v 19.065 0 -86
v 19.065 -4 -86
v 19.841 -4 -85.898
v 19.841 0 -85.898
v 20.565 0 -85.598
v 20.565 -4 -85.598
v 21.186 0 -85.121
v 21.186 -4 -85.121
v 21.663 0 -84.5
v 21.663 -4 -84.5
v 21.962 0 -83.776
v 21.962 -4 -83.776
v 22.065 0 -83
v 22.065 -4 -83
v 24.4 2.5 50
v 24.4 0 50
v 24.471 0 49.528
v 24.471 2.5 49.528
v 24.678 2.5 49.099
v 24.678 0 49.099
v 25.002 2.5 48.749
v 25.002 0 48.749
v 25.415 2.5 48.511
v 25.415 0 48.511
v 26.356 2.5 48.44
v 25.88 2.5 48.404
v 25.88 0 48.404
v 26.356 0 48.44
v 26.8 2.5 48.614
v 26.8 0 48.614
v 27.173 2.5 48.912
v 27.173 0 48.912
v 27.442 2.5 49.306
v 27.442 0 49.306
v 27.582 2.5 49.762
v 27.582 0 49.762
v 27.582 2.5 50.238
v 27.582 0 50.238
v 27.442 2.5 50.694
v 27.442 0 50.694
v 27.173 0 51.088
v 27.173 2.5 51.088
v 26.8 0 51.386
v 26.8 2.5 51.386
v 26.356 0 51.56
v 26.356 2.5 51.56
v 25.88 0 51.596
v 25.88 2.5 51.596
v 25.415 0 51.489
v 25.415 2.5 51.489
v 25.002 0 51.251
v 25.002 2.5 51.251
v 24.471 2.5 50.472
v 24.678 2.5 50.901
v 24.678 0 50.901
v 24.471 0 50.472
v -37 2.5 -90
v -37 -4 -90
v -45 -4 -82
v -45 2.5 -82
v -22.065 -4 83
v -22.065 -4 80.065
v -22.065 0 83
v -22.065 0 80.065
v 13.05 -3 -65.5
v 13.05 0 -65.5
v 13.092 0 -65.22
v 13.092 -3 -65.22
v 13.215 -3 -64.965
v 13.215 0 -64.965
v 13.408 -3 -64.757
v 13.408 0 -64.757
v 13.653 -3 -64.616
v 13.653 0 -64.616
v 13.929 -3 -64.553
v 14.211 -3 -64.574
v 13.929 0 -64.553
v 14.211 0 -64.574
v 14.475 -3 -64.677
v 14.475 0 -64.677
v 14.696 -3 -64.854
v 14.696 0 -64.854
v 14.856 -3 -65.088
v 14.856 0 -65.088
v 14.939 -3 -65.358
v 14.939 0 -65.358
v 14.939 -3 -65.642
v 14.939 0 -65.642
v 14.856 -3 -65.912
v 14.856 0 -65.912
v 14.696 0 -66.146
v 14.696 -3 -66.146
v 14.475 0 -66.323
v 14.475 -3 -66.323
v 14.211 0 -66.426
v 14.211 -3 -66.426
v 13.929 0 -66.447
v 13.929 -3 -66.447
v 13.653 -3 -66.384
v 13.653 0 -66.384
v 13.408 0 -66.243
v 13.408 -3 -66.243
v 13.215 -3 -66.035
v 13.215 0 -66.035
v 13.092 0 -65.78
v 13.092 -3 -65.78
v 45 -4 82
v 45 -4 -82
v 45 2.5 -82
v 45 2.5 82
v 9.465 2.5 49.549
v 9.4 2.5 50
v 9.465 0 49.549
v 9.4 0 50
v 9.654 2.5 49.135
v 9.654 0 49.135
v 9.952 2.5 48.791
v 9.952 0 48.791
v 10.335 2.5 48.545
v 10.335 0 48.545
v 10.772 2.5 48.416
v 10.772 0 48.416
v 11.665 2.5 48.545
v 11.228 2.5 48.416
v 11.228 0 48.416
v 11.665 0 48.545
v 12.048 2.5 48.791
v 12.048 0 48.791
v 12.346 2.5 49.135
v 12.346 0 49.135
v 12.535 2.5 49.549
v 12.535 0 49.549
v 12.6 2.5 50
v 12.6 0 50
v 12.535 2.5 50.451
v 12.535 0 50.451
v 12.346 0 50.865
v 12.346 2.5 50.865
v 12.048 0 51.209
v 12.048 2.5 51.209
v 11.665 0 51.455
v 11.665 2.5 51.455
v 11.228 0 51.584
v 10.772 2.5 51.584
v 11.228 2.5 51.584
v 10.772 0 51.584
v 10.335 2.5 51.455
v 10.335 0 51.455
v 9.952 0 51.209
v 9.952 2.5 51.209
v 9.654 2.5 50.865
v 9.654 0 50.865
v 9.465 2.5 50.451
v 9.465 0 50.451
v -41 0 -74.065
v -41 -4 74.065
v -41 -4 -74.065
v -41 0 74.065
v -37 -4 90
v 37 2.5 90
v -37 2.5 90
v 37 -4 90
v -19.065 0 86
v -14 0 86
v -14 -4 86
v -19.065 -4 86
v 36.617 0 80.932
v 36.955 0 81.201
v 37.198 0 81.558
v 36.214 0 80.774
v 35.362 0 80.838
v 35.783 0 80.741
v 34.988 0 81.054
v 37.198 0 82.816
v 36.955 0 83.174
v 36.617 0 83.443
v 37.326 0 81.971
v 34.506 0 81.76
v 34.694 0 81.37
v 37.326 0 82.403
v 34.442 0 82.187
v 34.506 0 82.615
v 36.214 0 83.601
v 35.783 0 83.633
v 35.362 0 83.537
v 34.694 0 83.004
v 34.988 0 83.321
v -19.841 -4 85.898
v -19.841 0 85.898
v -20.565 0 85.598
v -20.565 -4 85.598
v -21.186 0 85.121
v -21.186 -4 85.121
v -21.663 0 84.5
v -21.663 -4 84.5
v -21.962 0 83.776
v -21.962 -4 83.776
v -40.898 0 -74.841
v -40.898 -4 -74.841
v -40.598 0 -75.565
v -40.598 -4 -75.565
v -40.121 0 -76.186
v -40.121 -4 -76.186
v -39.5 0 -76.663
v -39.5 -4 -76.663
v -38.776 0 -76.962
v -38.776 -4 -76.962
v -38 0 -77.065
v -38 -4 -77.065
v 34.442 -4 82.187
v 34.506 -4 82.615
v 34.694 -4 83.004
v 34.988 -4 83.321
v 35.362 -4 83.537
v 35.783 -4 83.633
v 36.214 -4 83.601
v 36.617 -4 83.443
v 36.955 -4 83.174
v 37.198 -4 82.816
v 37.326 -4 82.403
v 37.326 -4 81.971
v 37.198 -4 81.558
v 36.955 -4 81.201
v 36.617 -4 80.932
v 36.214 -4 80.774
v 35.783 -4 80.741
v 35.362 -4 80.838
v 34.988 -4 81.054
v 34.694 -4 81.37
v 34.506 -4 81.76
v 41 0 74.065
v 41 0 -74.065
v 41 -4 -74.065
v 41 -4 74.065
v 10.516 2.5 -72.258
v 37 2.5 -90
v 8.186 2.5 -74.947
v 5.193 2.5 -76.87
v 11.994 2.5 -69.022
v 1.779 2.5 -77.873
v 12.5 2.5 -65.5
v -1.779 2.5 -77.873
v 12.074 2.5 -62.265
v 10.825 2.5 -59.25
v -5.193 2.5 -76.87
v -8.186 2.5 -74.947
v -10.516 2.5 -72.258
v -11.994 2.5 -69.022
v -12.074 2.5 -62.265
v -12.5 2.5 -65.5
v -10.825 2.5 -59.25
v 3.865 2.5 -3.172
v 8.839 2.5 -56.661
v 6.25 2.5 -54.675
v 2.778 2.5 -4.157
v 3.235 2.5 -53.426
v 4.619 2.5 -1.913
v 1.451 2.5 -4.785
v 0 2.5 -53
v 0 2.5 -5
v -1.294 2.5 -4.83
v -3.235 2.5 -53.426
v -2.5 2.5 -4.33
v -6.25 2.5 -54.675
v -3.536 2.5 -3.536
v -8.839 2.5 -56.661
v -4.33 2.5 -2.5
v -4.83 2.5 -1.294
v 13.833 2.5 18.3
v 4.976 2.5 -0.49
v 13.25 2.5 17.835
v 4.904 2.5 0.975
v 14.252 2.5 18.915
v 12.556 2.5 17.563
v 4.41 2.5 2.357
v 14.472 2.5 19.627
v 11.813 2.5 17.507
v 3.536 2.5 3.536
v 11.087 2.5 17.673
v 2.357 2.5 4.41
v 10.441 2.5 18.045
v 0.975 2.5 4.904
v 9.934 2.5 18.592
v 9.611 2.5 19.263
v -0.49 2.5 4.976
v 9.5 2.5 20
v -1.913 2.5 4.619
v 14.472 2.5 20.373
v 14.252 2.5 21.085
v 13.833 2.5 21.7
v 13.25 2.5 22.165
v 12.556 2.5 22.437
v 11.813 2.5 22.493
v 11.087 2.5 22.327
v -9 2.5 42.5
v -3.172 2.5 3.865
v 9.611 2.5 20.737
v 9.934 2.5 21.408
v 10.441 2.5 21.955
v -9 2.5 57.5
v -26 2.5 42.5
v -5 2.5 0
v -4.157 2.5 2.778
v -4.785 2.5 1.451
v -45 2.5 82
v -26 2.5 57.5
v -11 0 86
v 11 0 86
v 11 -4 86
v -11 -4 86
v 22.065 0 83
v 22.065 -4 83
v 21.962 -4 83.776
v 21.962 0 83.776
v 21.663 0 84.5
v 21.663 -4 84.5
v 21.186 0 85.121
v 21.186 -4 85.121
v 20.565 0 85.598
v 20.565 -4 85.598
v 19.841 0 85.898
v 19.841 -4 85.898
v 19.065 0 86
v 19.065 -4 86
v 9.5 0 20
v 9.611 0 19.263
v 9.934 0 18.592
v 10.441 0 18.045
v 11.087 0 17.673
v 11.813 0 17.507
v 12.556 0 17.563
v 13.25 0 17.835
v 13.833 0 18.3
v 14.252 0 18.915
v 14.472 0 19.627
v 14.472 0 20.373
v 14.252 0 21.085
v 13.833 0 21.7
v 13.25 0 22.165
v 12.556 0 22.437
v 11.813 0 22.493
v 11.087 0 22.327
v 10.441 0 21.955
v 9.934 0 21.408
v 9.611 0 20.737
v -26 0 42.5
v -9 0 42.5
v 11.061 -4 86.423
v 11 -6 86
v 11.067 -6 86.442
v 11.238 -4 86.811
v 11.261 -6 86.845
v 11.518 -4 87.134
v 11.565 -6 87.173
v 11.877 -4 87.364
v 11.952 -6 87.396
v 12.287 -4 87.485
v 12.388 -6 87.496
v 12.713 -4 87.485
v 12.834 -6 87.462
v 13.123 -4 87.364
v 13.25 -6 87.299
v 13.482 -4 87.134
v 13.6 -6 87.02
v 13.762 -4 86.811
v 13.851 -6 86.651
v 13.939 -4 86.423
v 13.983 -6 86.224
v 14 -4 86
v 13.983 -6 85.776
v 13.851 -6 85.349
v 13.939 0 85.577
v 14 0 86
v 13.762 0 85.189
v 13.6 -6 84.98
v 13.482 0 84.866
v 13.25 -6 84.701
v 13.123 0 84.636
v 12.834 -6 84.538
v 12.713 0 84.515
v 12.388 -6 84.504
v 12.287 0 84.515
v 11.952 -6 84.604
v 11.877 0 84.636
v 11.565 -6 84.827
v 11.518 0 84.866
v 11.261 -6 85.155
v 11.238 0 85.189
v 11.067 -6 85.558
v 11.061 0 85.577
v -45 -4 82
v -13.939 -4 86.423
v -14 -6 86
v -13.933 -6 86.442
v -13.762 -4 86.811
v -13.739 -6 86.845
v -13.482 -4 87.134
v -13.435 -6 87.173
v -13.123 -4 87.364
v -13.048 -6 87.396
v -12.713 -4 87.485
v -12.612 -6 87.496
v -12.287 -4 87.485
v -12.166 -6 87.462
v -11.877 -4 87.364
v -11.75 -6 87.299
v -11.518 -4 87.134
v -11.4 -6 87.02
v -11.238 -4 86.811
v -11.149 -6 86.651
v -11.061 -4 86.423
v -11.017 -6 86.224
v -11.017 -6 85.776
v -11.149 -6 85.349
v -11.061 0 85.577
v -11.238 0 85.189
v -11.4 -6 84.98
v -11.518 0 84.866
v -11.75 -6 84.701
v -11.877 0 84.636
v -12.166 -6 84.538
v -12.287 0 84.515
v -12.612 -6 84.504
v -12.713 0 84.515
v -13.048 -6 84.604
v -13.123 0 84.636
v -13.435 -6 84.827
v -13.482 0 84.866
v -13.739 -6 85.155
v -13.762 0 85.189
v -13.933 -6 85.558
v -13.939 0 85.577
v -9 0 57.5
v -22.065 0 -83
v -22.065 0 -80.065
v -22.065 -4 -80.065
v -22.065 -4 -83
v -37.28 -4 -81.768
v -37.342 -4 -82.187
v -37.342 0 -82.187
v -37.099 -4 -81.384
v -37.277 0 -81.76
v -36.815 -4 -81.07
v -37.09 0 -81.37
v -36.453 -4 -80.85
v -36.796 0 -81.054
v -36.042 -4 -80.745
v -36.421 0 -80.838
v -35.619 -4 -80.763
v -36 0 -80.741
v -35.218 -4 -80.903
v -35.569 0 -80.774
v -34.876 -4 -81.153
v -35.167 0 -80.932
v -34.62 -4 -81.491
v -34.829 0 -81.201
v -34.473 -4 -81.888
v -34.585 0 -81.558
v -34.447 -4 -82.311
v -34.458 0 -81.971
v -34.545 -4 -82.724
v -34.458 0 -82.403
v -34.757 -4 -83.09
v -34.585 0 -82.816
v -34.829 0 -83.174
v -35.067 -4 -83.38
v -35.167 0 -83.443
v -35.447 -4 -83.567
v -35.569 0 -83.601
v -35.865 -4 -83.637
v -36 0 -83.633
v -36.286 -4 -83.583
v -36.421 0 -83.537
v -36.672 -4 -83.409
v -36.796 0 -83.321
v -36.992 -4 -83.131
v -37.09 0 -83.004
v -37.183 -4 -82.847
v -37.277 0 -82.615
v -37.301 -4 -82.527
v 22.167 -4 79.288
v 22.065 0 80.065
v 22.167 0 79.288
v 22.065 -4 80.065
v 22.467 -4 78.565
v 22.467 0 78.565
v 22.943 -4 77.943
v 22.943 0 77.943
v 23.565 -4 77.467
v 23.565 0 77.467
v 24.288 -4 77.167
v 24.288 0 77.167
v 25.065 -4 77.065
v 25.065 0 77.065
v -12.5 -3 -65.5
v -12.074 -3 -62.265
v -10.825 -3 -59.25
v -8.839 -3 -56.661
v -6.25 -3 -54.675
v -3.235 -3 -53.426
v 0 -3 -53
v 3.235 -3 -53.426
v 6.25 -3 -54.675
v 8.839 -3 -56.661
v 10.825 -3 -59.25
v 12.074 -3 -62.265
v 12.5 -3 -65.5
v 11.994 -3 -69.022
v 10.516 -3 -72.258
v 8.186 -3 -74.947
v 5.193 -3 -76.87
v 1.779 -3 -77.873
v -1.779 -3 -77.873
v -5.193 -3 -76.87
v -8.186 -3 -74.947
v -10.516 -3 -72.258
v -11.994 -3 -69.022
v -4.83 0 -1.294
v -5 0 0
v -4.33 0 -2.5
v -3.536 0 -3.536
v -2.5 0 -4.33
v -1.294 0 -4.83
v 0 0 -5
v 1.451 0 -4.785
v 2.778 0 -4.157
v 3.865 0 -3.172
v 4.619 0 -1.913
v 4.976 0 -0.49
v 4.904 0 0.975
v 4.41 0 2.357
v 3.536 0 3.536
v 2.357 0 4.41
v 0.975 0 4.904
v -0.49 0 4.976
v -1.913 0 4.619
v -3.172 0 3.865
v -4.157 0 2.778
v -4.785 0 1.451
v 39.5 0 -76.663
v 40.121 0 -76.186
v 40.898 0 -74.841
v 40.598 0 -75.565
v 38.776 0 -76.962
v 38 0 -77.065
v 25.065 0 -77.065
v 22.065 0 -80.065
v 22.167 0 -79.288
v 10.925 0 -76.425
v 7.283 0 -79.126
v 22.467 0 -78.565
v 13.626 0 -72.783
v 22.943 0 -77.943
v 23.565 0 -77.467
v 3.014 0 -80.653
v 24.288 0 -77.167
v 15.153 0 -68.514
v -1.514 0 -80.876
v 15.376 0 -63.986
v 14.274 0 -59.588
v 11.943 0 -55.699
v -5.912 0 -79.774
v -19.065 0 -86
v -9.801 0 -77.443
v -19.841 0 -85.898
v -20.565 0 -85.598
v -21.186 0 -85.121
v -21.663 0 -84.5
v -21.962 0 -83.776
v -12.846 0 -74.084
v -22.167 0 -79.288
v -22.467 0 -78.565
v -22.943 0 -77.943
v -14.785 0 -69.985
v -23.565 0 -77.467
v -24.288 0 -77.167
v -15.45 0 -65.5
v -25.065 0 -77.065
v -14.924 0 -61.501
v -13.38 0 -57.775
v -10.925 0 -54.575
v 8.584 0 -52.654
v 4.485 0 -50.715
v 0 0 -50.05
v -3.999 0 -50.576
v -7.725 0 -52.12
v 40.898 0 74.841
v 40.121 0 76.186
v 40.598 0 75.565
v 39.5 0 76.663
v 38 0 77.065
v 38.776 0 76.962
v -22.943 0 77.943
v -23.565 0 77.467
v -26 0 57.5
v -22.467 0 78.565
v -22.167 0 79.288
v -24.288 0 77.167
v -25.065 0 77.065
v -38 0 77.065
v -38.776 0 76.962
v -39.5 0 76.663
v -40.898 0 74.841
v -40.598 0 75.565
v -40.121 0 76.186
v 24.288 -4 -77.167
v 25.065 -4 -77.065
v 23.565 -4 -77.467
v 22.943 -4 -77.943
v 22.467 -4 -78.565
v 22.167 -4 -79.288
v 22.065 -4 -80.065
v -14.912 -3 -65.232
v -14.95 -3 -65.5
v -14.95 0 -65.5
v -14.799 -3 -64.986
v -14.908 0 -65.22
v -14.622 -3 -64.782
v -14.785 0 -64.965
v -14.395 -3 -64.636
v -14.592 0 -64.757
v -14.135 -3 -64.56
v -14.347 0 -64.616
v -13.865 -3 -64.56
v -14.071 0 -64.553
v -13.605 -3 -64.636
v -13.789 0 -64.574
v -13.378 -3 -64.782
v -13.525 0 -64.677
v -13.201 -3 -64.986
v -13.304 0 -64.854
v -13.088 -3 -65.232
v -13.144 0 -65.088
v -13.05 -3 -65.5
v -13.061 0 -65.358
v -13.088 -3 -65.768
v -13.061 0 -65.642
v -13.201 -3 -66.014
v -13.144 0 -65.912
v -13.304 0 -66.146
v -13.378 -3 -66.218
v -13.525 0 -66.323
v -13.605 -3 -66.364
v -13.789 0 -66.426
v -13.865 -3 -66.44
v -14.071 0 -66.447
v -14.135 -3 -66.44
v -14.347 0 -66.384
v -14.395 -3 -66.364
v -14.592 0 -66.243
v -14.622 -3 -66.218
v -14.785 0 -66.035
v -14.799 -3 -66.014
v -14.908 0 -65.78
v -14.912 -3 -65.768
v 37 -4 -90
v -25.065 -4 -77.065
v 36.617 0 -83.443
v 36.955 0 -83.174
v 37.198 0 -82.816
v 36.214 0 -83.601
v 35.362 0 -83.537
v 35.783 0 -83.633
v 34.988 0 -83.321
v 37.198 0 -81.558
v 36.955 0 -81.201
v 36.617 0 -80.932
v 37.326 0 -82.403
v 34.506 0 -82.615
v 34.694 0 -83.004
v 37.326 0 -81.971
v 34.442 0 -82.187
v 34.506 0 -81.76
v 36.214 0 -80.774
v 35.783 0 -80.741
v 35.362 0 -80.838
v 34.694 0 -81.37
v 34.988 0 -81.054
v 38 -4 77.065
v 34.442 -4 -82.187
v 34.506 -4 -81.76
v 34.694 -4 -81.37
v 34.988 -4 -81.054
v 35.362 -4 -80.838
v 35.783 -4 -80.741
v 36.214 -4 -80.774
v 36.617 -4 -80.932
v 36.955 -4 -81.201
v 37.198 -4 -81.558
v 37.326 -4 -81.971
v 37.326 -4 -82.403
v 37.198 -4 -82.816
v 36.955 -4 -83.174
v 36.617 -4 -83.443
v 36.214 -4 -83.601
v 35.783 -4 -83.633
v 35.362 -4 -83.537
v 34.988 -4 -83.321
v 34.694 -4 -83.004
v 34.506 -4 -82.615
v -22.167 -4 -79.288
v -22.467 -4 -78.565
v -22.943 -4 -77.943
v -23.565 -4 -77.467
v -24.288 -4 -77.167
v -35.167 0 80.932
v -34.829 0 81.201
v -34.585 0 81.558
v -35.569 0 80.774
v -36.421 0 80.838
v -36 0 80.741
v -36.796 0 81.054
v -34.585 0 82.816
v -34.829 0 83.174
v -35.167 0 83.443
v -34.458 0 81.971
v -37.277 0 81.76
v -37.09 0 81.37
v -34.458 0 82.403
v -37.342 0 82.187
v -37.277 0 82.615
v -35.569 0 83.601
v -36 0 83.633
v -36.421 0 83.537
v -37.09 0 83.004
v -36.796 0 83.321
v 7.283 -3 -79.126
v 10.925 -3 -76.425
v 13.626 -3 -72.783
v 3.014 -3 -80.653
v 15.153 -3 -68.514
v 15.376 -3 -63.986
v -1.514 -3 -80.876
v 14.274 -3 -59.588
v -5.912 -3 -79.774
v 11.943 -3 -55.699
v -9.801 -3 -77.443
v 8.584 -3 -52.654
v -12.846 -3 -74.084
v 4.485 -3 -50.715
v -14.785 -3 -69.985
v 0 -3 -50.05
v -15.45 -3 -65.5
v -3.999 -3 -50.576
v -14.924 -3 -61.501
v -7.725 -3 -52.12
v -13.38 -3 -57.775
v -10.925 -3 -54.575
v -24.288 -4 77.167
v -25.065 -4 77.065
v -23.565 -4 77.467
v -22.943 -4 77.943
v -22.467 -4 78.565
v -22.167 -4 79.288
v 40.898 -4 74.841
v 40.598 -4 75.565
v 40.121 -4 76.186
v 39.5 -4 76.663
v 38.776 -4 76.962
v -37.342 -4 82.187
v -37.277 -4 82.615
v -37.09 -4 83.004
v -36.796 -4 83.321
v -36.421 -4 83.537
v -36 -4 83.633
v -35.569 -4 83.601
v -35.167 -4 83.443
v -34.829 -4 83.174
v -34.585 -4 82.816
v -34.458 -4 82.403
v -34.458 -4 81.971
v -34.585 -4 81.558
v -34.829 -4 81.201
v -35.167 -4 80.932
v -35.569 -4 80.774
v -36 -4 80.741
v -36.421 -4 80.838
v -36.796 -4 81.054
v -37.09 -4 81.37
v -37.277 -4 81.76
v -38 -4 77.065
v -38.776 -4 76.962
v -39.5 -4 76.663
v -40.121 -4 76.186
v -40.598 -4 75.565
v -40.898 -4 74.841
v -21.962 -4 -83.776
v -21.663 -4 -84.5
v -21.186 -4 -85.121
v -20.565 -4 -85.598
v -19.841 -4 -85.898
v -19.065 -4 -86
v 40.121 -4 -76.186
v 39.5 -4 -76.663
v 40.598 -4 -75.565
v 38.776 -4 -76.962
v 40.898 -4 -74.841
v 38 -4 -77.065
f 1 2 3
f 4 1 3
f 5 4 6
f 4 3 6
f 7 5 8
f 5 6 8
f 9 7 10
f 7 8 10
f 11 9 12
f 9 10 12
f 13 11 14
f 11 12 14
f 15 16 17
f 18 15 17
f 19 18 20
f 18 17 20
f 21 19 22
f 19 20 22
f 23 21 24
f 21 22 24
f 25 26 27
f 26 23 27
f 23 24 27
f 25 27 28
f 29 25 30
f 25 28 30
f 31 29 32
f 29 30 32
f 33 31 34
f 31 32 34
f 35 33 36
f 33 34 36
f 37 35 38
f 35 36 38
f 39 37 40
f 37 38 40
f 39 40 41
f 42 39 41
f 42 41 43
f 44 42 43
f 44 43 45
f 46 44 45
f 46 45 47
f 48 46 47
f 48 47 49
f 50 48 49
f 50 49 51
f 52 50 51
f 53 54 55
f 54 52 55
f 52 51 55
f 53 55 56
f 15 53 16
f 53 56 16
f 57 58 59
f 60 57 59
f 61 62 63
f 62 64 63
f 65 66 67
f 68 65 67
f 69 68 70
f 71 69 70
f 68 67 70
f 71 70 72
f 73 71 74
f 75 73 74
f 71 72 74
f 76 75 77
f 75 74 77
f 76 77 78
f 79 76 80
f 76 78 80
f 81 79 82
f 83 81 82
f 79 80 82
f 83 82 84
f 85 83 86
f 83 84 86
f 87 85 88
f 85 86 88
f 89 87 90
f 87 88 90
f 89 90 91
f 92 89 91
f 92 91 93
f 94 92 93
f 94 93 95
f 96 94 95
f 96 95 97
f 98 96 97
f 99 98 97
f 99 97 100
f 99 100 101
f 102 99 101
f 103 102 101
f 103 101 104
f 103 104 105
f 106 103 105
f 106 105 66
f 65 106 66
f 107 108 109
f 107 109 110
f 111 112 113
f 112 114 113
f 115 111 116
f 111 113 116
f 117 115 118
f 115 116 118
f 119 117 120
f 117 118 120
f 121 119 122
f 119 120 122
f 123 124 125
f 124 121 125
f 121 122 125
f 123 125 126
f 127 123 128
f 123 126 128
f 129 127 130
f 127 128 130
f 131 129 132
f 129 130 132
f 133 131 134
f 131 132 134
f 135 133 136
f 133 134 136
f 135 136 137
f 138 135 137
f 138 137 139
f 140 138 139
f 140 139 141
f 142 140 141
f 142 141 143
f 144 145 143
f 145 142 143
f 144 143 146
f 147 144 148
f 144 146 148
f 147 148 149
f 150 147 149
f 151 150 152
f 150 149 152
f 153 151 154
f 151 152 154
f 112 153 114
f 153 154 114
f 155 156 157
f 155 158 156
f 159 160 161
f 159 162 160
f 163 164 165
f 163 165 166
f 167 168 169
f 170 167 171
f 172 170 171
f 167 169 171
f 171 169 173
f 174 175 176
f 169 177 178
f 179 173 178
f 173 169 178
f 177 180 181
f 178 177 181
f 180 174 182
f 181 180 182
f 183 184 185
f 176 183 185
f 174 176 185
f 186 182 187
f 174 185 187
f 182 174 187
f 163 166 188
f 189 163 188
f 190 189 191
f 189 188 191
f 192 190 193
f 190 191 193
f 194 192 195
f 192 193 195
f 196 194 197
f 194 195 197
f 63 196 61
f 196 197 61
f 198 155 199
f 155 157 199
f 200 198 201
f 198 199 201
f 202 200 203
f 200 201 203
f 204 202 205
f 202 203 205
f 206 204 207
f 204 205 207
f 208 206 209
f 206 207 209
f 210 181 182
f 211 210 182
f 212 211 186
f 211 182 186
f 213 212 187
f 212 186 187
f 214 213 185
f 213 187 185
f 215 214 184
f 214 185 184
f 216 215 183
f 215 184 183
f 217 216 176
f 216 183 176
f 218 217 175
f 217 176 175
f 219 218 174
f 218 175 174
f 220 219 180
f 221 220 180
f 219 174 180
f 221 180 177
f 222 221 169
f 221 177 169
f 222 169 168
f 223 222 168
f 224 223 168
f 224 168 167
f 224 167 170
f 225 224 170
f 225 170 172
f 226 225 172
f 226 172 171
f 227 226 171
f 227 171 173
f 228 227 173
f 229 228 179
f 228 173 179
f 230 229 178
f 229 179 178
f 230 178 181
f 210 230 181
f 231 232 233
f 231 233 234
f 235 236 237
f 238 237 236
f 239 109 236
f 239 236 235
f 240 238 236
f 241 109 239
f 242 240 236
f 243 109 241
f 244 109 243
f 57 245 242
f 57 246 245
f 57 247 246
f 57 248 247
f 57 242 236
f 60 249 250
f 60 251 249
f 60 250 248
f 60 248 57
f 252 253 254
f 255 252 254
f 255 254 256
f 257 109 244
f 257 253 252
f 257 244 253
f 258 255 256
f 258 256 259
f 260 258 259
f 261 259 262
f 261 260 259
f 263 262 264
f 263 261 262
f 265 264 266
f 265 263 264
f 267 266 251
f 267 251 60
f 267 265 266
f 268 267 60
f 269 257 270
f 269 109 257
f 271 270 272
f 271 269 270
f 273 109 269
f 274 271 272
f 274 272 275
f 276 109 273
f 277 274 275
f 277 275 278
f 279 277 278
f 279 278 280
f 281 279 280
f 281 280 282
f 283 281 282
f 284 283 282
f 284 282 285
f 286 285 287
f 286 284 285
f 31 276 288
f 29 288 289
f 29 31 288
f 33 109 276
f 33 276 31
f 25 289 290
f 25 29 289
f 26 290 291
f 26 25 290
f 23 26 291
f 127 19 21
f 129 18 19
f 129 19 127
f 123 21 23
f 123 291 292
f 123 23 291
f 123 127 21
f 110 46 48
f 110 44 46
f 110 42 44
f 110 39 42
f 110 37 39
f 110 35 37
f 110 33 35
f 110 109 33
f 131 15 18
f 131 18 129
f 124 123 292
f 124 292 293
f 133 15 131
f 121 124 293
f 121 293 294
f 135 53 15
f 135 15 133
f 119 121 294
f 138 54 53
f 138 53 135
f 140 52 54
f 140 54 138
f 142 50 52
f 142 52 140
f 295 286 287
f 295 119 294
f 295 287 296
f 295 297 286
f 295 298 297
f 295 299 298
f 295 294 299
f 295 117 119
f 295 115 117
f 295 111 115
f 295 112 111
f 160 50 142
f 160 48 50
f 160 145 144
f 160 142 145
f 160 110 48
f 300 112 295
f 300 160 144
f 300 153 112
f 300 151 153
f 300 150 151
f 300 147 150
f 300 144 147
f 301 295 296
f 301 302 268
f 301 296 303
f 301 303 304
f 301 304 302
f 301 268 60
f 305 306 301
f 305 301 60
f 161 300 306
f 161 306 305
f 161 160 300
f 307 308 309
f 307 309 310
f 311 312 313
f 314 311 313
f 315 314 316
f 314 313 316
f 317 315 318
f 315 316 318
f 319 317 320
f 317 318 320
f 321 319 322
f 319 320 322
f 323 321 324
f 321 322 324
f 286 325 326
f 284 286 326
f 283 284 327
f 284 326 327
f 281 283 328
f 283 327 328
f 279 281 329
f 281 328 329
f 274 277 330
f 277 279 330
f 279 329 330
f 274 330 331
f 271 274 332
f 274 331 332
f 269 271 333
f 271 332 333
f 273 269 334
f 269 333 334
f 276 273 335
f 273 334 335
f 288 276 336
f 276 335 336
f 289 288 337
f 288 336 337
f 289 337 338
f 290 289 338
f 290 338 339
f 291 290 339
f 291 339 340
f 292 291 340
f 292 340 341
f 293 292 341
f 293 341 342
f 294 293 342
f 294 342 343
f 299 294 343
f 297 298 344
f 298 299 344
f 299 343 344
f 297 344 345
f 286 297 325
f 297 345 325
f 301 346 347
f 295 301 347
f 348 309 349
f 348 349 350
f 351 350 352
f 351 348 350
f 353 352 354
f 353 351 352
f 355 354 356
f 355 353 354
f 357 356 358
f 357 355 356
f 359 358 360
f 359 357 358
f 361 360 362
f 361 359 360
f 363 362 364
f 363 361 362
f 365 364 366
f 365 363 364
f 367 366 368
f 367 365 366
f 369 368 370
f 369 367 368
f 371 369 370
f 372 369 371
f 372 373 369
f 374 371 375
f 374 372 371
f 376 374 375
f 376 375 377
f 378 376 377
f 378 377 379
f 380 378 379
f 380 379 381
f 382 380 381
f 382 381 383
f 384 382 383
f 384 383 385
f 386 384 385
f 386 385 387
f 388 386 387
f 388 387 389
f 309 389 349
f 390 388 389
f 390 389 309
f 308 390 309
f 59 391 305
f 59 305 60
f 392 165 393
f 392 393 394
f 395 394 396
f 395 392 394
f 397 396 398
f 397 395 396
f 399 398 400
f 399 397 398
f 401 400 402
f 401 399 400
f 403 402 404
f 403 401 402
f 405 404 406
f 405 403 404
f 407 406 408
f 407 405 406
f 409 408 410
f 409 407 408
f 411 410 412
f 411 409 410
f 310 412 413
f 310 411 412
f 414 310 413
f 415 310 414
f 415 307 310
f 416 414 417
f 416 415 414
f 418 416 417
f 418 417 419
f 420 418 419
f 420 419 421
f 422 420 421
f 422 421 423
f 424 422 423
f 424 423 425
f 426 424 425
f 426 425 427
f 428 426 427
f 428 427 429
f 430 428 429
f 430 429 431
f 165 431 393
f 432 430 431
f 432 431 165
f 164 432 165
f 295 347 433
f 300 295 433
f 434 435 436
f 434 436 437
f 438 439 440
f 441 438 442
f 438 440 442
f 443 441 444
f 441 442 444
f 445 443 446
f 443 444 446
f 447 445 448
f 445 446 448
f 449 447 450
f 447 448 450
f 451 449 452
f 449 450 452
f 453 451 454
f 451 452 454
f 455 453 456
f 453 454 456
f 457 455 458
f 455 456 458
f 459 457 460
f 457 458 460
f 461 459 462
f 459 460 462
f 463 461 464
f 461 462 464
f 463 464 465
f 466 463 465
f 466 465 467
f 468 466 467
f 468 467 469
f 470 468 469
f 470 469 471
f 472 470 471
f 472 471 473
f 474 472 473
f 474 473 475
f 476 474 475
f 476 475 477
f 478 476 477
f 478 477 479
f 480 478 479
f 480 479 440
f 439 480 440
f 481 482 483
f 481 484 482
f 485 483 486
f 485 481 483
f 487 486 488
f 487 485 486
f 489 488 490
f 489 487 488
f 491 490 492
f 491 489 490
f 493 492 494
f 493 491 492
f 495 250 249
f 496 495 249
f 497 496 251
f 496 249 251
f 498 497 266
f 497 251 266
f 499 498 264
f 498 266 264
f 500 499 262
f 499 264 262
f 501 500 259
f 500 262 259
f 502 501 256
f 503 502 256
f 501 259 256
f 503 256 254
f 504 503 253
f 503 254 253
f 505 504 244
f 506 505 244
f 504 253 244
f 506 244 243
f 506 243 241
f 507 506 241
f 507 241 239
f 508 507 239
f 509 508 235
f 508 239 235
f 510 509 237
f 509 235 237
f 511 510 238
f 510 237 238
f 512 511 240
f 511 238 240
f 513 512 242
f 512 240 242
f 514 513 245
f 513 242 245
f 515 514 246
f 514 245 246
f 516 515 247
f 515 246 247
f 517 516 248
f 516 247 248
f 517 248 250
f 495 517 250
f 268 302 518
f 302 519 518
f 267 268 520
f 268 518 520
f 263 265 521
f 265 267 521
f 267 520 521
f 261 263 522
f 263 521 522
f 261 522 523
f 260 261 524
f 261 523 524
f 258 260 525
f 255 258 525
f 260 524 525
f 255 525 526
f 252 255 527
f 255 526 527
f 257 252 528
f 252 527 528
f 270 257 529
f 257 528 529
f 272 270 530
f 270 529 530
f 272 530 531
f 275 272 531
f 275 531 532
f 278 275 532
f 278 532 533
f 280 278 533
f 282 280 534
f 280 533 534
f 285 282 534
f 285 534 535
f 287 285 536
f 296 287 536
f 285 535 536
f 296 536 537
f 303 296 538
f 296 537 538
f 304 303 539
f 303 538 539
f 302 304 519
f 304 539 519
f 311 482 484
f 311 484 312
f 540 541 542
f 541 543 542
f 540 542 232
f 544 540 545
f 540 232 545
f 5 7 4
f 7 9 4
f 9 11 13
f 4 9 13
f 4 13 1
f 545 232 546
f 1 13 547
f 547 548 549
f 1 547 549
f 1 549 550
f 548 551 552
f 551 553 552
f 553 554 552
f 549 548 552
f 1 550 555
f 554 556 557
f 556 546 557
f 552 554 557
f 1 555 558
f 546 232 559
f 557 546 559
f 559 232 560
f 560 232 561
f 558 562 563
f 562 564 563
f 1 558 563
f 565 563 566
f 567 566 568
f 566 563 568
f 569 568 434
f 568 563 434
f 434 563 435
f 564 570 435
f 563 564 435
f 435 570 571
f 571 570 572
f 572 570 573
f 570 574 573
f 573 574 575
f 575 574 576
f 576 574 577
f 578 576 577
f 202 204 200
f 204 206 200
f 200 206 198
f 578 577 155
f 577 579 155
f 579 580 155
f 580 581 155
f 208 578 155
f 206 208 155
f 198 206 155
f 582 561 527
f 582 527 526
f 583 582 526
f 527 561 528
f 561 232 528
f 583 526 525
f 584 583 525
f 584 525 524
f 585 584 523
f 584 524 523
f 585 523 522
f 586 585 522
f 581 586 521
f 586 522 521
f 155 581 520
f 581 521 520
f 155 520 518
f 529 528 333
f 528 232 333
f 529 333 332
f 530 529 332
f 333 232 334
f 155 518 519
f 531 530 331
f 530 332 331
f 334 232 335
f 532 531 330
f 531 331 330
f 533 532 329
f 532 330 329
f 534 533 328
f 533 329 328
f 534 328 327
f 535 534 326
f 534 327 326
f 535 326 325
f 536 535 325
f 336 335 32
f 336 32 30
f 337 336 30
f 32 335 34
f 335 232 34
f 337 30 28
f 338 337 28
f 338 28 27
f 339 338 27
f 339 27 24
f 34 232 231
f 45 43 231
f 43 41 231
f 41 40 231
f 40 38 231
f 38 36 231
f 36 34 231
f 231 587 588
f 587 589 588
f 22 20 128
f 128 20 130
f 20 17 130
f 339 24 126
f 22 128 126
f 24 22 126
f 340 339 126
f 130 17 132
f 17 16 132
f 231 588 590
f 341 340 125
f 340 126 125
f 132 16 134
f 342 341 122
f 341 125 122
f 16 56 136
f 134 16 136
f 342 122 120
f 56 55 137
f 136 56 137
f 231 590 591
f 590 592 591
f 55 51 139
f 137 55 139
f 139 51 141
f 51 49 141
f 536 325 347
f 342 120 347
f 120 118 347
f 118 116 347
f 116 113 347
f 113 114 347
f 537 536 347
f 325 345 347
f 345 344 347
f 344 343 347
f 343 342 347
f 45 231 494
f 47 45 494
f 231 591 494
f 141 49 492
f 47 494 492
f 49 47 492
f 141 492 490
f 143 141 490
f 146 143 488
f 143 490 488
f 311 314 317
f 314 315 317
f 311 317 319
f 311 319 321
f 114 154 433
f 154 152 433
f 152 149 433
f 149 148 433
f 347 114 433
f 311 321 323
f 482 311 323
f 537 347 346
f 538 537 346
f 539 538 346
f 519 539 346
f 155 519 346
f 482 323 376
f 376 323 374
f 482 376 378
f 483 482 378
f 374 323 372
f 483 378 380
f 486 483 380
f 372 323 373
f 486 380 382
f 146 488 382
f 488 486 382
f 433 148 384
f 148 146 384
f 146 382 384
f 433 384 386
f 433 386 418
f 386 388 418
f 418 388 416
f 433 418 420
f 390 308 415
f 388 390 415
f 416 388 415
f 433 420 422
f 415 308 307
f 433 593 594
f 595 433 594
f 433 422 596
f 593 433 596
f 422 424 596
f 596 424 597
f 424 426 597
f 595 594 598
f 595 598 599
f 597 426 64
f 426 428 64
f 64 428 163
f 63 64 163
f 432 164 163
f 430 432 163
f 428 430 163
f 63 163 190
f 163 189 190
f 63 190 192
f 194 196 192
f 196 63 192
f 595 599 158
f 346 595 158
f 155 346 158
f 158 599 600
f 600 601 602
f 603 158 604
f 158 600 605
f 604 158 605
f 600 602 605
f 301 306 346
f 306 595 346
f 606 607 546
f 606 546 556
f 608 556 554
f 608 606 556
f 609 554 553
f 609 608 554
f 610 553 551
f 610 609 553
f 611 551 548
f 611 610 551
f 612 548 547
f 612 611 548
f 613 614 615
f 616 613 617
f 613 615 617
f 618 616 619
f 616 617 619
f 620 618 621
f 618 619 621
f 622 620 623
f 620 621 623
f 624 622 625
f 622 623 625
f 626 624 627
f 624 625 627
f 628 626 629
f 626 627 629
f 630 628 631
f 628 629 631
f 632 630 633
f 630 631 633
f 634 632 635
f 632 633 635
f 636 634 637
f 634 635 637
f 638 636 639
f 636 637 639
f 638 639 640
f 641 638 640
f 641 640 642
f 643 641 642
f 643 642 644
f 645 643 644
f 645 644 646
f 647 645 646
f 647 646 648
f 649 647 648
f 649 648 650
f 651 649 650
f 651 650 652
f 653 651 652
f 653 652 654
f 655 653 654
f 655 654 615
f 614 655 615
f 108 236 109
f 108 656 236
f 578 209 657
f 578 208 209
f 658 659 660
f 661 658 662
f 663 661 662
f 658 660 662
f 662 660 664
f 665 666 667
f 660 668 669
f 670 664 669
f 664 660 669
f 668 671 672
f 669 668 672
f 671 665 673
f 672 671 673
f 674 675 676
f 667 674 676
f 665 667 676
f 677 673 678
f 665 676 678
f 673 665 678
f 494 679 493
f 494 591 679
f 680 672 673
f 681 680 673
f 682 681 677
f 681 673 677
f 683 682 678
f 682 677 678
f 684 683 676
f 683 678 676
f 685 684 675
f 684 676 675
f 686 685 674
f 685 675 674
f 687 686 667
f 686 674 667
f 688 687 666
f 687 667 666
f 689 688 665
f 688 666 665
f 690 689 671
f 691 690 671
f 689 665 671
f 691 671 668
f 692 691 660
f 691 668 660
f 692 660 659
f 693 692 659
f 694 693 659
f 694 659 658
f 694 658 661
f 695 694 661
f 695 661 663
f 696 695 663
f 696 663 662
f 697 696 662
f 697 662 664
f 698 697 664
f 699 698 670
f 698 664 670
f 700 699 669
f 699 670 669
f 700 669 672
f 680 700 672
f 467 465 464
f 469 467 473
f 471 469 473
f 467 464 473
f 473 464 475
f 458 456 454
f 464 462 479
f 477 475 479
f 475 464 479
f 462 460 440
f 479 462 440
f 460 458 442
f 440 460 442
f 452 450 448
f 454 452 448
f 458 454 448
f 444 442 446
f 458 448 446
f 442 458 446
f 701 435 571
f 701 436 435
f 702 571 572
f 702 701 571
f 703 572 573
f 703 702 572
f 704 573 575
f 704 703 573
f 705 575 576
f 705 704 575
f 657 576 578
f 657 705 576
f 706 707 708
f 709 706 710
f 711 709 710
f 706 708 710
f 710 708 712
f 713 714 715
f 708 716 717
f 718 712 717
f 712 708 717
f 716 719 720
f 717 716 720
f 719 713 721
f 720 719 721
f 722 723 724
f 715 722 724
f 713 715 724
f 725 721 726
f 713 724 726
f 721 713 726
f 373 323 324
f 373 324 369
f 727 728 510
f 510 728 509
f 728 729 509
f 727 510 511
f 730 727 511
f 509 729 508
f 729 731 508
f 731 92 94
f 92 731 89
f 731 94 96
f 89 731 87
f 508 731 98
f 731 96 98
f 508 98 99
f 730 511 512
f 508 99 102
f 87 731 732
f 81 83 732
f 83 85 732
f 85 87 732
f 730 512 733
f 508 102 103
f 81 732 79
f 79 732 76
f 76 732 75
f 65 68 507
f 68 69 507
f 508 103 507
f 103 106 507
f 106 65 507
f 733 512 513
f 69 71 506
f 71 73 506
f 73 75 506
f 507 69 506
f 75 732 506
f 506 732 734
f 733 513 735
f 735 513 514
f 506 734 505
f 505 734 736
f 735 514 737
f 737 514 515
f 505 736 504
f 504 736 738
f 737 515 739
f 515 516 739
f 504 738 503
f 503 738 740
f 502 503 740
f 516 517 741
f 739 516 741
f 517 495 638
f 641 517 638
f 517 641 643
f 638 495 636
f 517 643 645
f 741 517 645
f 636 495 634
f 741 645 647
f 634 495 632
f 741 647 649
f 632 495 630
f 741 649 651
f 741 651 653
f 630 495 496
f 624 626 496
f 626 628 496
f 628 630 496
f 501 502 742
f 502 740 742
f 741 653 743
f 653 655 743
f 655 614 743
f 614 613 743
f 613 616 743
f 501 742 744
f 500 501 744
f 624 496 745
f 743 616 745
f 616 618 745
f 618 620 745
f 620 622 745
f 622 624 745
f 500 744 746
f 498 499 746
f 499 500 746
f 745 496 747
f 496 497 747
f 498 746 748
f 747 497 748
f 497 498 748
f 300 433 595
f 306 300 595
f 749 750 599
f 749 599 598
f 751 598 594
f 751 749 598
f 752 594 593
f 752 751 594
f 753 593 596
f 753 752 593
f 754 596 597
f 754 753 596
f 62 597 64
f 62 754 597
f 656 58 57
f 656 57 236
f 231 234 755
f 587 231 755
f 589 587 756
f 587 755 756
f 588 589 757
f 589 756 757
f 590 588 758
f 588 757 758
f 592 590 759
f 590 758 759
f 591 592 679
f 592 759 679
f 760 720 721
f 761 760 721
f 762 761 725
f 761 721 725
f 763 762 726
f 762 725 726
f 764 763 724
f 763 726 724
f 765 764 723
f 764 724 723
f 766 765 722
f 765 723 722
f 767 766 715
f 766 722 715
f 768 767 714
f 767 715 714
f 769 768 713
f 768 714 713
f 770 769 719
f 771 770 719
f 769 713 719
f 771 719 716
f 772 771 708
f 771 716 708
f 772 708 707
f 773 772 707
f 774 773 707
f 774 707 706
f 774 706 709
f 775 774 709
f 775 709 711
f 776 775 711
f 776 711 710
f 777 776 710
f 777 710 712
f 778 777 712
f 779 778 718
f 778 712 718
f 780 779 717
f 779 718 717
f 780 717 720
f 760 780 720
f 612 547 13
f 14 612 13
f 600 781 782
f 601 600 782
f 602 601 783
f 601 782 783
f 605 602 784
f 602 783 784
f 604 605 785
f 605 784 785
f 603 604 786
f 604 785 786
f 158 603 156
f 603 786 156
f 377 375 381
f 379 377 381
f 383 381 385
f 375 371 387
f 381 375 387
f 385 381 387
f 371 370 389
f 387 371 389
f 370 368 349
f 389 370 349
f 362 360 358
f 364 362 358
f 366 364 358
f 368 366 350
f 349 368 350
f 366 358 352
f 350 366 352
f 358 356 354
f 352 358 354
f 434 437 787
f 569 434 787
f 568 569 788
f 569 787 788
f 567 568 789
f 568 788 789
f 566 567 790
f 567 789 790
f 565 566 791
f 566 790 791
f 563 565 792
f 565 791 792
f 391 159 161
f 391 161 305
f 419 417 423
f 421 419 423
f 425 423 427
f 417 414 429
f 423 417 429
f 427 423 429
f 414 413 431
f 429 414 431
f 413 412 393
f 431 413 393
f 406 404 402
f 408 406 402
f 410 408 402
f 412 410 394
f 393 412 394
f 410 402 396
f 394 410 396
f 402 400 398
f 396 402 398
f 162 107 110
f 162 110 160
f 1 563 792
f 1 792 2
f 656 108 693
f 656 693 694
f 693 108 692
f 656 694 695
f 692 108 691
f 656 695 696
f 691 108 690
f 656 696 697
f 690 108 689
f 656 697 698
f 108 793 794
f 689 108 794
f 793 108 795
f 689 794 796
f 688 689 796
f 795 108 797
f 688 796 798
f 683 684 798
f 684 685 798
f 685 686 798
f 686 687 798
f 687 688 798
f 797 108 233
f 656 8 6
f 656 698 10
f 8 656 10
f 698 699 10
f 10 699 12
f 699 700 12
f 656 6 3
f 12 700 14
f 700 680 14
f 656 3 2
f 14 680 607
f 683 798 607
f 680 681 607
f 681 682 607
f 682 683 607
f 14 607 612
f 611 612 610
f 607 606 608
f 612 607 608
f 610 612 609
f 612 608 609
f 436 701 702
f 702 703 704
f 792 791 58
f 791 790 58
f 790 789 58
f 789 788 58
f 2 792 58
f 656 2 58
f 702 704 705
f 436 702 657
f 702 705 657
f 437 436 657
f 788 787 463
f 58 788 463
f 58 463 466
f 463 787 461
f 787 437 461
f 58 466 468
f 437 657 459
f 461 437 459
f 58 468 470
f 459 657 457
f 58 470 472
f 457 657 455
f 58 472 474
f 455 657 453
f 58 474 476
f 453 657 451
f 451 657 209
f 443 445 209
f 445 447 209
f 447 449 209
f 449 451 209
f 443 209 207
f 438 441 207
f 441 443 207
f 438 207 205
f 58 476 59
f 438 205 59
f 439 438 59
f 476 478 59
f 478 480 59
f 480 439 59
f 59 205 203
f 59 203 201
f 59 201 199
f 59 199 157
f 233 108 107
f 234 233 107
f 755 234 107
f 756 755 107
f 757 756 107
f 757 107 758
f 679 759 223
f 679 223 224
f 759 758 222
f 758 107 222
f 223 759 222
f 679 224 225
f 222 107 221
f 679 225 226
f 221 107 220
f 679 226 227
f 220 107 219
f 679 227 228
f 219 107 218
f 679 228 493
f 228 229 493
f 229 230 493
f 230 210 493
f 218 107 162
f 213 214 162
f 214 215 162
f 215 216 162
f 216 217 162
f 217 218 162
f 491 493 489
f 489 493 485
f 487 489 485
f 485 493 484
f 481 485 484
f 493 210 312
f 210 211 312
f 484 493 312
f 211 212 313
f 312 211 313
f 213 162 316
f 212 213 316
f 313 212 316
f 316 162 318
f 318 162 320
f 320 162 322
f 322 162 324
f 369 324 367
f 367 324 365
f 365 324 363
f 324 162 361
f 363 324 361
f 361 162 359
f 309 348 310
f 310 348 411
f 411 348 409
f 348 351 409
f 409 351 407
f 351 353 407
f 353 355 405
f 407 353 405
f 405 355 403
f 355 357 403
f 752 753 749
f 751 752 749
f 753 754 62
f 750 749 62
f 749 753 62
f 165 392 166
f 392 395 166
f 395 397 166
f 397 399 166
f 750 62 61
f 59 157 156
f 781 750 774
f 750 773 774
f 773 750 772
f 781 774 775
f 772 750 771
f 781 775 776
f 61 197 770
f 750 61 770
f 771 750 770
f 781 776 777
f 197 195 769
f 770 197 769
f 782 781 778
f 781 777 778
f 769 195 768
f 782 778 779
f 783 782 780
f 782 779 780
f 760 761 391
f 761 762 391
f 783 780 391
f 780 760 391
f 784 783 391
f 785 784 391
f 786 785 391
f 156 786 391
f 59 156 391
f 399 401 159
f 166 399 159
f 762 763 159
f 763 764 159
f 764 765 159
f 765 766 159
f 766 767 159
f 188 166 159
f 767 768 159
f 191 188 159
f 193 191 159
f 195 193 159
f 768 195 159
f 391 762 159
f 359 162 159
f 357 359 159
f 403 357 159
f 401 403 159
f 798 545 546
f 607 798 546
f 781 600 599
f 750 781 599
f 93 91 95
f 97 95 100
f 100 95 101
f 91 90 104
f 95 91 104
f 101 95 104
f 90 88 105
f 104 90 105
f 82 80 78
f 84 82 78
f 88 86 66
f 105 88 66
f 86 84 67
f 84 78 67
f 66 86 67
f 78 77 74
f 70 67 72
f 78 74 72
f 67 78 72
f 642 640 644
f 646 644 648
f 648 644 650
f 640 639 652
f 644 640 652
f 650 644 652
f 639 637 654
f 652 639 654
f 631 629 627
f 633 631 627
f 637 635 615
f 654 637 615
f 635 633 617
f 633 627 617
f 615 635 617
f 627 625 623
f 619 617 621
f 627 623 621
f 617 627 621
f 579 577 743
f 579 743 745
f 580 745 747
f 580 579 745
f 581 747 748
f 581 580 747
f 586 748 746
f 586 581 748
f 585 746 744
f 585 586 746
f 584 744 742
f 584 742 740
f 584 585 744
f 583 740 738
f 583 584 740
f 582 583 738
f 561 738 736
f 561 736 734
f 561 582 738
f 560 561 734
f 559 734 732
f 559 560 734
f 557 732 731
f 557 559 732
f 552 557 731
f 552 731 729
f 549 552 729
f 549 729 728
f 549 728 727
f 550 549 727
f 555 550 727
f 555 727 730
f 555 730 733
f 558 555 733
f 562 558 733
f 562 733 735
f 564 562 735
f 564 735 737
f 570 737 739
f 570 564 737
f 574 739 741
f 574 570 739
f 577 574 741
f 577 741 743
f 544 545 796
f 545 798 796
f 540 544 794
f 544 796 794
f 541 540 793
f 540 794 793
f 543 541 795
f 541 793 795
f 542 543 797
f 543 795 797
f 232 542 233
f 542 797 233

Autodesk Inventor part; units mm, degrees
ref_plane "YZ Plane" through (0, 0, 0) normal (1, 0, 0) x (0, 1, 0)
sketch "Sketch1" plane through (0, 0, 0) normal (0, 1, 0) x (-1, 0, 0)
  line L0 (37, -90) -> (-37, -90)
  line L1 (-45, -82) -> (-45, 82)
  line L2 (-37, 90) -> (37, 90)
  line L3 (45, 82) -> (45, -82)
  line L4 (45, -90) -> (-45, 90) construction
  line L5 (-45, -90) -> (45, 90) construction
  line L6 (-37, -90) -> (-45, -82)
  line L7 (37, -90) -> (45, -82)
  line L8 (37, 90) -> (45, 82)
  line L9 (-45, 82) -> (-37, 90)
  line L10 (0, 0) -> (0, -65.5)
  circle A0 centre (0, -65.5) radius 12.5
  line L11 (0, 0) -> (0, 0)
  circle A1 centre (0, 0) radius 5
  line L12 (0, 0) -> (17.5, 0)
  line L13 (17.5, 0) -> (17.5, 50)
  line L14 (17.5, 50) -> (0, 50)
  line L15 (0, 50) -> (0, 0)
  line L16 (26, 42.5) -> (9, 42.5)
  line L17 (9, 42.5) -> (9, 57.5)
  line L18 (9, 57.5) -> (26, 57.5)
  line L19 (26, 57.5) -> (26, 42.5)
  line L20 (26, 42.5) -> (9, 57.5) construction
  line L21 (9, 42.5) -> (26, 57.5) construction
  line L22 (9, 50) -> (-11, 50)
  circle A2 centre (-11, 50) radius 1.6
  line L23 (-11, 50) -> (-26, 50)
  circle A3 centre (-26, 50) radius 1.6
  line L24 (41, -80.3431) -> (35.3431, -86)
  line L25 (35.3431, -86) -> (-35.3431, -86)
  line L26 (-35.3431, -86) -> (-41, -80.3431)
  line L27 (-41, -80.3431) -> (-41, 80.3431)
  line L28 (-41, 80.3431) -> (-35.3431, 86)
  line L29 (-35.3431, 86) -> (35.3431, 86)
  line L30 (35.3431, 86) -> (41, 80.3431)
  line L31 (41, 80.3431) -> (41, -80.3431)
  line L32 (45, -90) -> (35.8917, -82.1873)
  circle A4 centre (35.8917, -82.1873) radius 1.45
  circle A5 centre (35.8917, -82.1873) radius 4.45
  line L33 (22.0647, -90) -> (45, -90)
  line L34 (45, -90) -> (45, -77.0647)
  line L35 (45, -77.0647) -> (22.0647, -77.0647)
  line L36 (22.0647, -77.0647) -> (22.0647, -90)
  circle A6 centre (-35.8917, -82.1873) radius 1.45
  circle A7 centre (-35.8917, -82.1873) radius 4.45
  line L37 (-45, -77.0647) -> (-22.0647, -77.0647)
  line L38 (-22.0647, -77.0647) -> (-22.0647, -90)
  circle A8 centre (35.8917, 82.1873) radius 1.45
  circle A9 centre (35.8917, 82.1873) radius 4.45
  line L39 (45, 77.0647) -> (22.0647, 77.0647)
  line L40 (22.0647, 77.0647) -> (22.0647, 90)
  circle A10 centre (-35.8917, 82.1873) radius 4.45
  circle A11 centre (-35.8917, 82.1873) radius 1.45
  line L41 (-45, 77.0647) -> (-22.0647, 77.0647)
  line L42 (-22.0647, 77.0647) -> (-22.0647, 90)
  line L43 (-22.0647, -90) -> (-45, -90)
  line L44 (-45, -90) -> (-45, -77.0647)
  line L45 (-22.0647, 90) -> (-45, 90)
  line L46 (-45, 90) -> (-45, 77.0647)
  line L47 (22.0647, 90) -> (45, 90)
  line L48 (45, 90) -> (45, 77.0647)
  line L49 (0, 0) -> (0, 20)
  line L50 (0, 0) -> (20, 0) construction
  line L51 (0, 20) -> (-12, 20)
  circle A12 centre (-12, 20) radius 2.5
  line L52 (0, 86) -> (12.5, 86)
  line L53 (0, 86) -> (-12.5, 86)
  circle A13 centre (12.5, 86) radius 1.5
  circle A14 centre (-12.5, 86) radius 1.5
  line L54 (0, -65.5) -> (14, -65.5)
  line L55 (0, -65.5) -> (14, -65.5) construction
  line L56 (0, -65.5) -> (-14, -65.5)
  line L57 (0, -65.5) -> (14, -65.5) construction
  circle A15 centre (14, -65.5) radius 0.95
  circle A16 centre (-14, -65.5) radius 0.95
  circle A17 centre (0, -65.5) radius 15.45
  point P0 (22.0647, -86)
  point P1 (-22.0647, -86)
  point P2 (-22.0647, -81.5147)
  point P3 (-26.5147, -77.0647)
  point P4 (-41, -77.0647)
  point P5 (-41, 77.0647)
  point P6 (-26.5147, 77.0647)
  point P7 (-22.0647, 81.5147)
  point P8 (-22.0647, 86)
  point P9 (22.0647, 86)
  point P10 (22.0647, 81.5147)
  point P11 (26.5147, 77.0647)
  point P12 (41, 77.0647)
  point P13 (41, -77.0647)
  point P14 (26.5147, -77.0647)
  point P15 (22.0647, -81.5147)
  point P16 (5, 0)
  point P17 (0, 5)
  point P18 (9, 50)
  point P19 (17.5, 42.5)
  dimension "d0" = 90
  dimension "d1" = 180
  dimension "d2" = 8
  dimension "d3" = 8
  dimension "d4" = 8
  dimension "d5" = 8
  dimension "d6" = 8
  dimension "d7" = 8
  dimension "d8" = 8
  dimension "d9" = 8
  dimension "d10" = 65.5
  dimension "d11" = 25
  dimension "d12" = 0
  dimension "d13" = 10
  dimension "d14" = 17.5
  dimension "d15" = 50
  dimension "d16" = 17
  dimension "d17" = 15
  dimension "d20" = 20
  dimension "d21" = 3.2
  dimension "d22" = 15
  dimension "d23" = 3.2
  dimension "d24" = 4
  dimension "d25" = 12
  dimension "d26" = 2.9
  dimension "d27" = 3
  dimension "d57" = 20
  dimension "d58" = 90
  dimension "d59" = 12
  dimension "d60" = 90
  dimension "d61" = 5
  dimension "d70" = 12.5
  dimension "d71" = 12.5
  dimension "d72" = 3
  dimension "d73" = 3
  dimension "d74" = 14
  dimension "d75" = 0
  dimension "d76" = 14
  dimension "d77" = 180
  dimension "d78" = 1.9
  dimension "d79" = 1.9
  dimension "d80" = 30.9
extrude "Extrusion1" add sketch "Sketch1" along normal blind 2.5 contours L0 L36 L25 A5 L32 L7 | L0 L38 L25 L36 | L32 A5 L24 L31 L35 L3 L7 | L0 L6 L1 L37 L27 L26 A7 L25 L38 | L36 L35 L31 L24 A5 L25 | L25 L38 L37 L27 L41 L42 L29 A14 A13 L40 L39 L31 L35 L36 | A5 L25 L24 L32 | L32 L24 A5 | L25 A7 L26 L27 L37 L38 | A4 | A5 L24 L25 | L35 L31 L39 L3 | A7 L26 L25 | L25 L26 A7 | L39 L31 L30 A9 L29 L40 L2 L8 L3 | L1 L41 L27 L37 | L39 L40 L29 A9 L30 L31 | L1 L9 L2 L42 L29 A10 L28 L27 L41 | L27 L28 A10 L29 L42 L41 | A9 L29 L30 | L30 L29 A9 | L29 A13 A14 L42 L2 L40 | A10 L29 L28 | L28 L29 A10 | A13 L29 | L29 A13 | A14 L29 | L29 A14 | A15 | A16 | A17 | A12 | A1 L15 L14 L17 L16 L13 L12 | A6 | A8 | A11
sketch "Sketch2" plane through (0, 0, 0) normal (0, -1, 0) x (1, 0, 0)
  line L0 (-26, 57.5) -> (-26, 42.5) projected
  line L1 (-26, 50) -> (-5, 50)
  circle A0 centre (-5, 50) radius 1.45
  circle A1 centre (-5, 50) radius 3.45
  circle A2 centre (0, -65.5) radius 12.5 projected
  line L2 (0, -65.5) -> (-14, -65.5)
  line L3 (0, -65.5) -> (14, -65.5)
  circle A3 centre (-14, -65.5) radius 0.95
  circle A4 centre (14, -65.5) radius 0.95
  circle A5 centre (-14, -65.5) radius 1.45
  circle A6 centre (14, -65.5) radius 1.45
  line L4 (-14, -66.95) -> (-12.3751, -67.2629) construction
  line L5 (-12.3751, -67.2629) -> (-11.6091, -68.4979) construction
  spline S0 degree 2 poles (-14, -66.95) (-12.3751, -67.2629) (-11.6091, -68.4979) knots 1 1 1 2 2 2
  line L6 (-14, -64.05) -> (-12.3751, -63.7371) construction
  line L7 (-12.3751, -63.7371) -> (-11.6091, -62.5021) construction
  spline S1 degree 2 poles (-14, -64.05) (-12.3751, -63.7371) (-11.6091, -62.5021) knots 1 1 1 2 2 2
  line L8 (0, -65.5) -> (0, -61.9317)
  line L9 (14, -66.95) -> (12.3751, -67.2629) construction
  line L10 (12.3751, -67.2629) -> (11.6091, -68.4979) construction
  spline S2 degree 2 poles (14, -66.95) (12.3751, -67.2629) (11.6091, -68.4979) knots 1 1 1 2 2 2
  spline S3 degree 2 poles (14, -64.05) (12.3751, -63.7371) (11.6091, -62.5021) knots 1 1 1 2 2 2
  line L11 (14, -64.05) -> (12.3751, -63.7371) construction
  line L12 (12.3751, -63.7371) -> (11.6091, -62.5021) construction
  circle A7 centre (0, -65.5) radius 12.5
  line L13 (-22.0647, 86) -> (22.0647, 86) projected
  line L14 (0, 60) -> (12.5, 60)
  line L15 (12.5, 60) -> (12.5, 86)
  line L16 (12.5, 86) -> (0, 86)
  line L17 (0, 86) -> (0, 60)
  circle A8 centre (12.5, 86) radius 1.5
  circle A9 centre (-12.5, 86) radius 1.5
  circle A10 centre (0, -65.5) radius 15.45
  point P0 (0, 0)
  point P1 (-12.3047, -67.7011)
  point P2 (-12.3047, -63.2989)
  point P3 (14, -64.05)
  point P4 (12.3047, -63.2989)
  point P5 (12.3047, -67.7011)
  point P6 (-15.45, -65.5)
  point P7 (15.45, -65.5)
  dimension "d30" = 21
  dimension "d31" = 2.9
  dimension "d32" = 2
  dimension "d33" = 14
  dimension "d34" = 14
  dimension "d35" = 1.9
  dimension "d36" = 1.9
  dimension "d37" = 0.5
  dimension "d38" = 0.5
  dimension "d41" = 12.5
  dimension "d42" = 3
ref_plane "Work Plane2" through (0, -4, 0) normal (0, -1, 0) x (1, 0, 0)
sketch "Sketch4" plane through (0, -4, 0) normal (0, -1, 0) x (1, 0, 0)
  line L0 (40.0685, -6.5) -> (29.9315, -6.5)
  line L1 (29.9315, -6.5) -> (29.9315, 6.5)
  line L2 (29.9315, 6.5) -> (40.0685, 6.5)
  line L3 (40.0685, 6.5) -> (40.0685, -6.5)
  line L4 (35, 82) -> (35, -82) projected
  line L5 (40.0685, -6.5) -> (29.9315, 6.5) construction
  line L6 (29.9315, -6.5) -> (40.0685, 6.5) construction
  point P0 (0, 0)
  point P1 (35, 0)
  point P2 (35, -6.5)
  point P3 (35, 6.5)
  dimension "d49" = 13
ref_plane "Work Plane1" through (0, -4, 0) normal (0, -1, 0) x (1, 0, 0)
sketch "Sketch5" plane through (0, -4, 0) normal (0, -1, 0) x (1, 0, 0)
  circle A0 centre (26.5147, -81.5147) radius 1.45 projected
  circle A1 centre (26.5147, -81.5147) radius 1.45
  circle A2 centre (-26.5147, -81.5147) radius 1.45 projected
  circle A3 centre (-26.5147, -81.5147) radius 1.45
  circle A4 centre (26.5147, 81.5147) radius 1.45 projected
  circle A5 centre (26.5147, 81.5147) radius 1.45
  circle A6 centre (-26.5147, 81.5147) radius 1.45 projected
  circle A7 centre (-26.5147, 81.5147) radius 1.45
  point P0 (0, 0)
extrude "Extrusion8" add sketch "Sketch1" against normal blind 4 contours L0 L36 L25 A5 L32 L7 | L0 L38 L25 L36 | L32 A5 L24 L31 L35 L3 L7 | L0 L6 L1 L37 L27 L26 A7 L25 L38 | L36 L35 L31 L24 A5 L25 | A5 L25 L24 L32 | L32 L24 A5 | L25 A7 L26 L27 L37 L38 | A5 L24 L25 | L35 L31 L39 L3 | A7 L26 L25 | L25 L26 A7 | L39 L31 L30 A9 L29 L40 L2 L8 L3 | L1 L41 L27 L37 | L39 L40 L29 A9 L30 L31 | L1 L9 L2 L42 L29 A10 L28 L27 L41 | L27 L28 A10 L29 L42 L41 | A9 L29 L30 | L30 L29 A9 | L29 A13 A14 L42 L2 L40 | A10 L29 L28 | L28 L29 A10 | L29 A13 | A14 L29 picked at (11.5718, 86.352) picked at (-13.4282, 86.352)
extrude "Extrusion9" add sketch "Sketch2" along normal blind 3 contours L3 A6 S2 A2 | A2 S3 A6 L3 | A2 S1 A5 A10 A6 S3 | S2 A6 A10 A5 S0 A2 | A6 | A2 L2 A5 S1 | S0 A5 L2 A2 | A5
extrude "Extrusion10" cut sketch "Sketch1" along normal blind 2.5 contours L12 A1 L10 | L15 A1 L12 | L10 A1 L15
extrude "Extrusion11" cut sketch "Sketch1" against normal blind 4 contours L25 L38 L37 L27 L41 L42 L29 A14 A13 L40 L39 L31 L35 L36 | A13 L29 | L29 A14 | L12 A1 L10 | L15 A1 L12 | L10 A1 L15 | A15 | A16 | A17 picked at (11.5145, 85.8803) picked at (-13.4855, 85.8803)
extrude "Extrusion12" add sketch "Sketch1" against normal blind 3 contours A17
extrude "Extrusion13" add sketch "Sketch1" against normal blind 6 contours A13 L29 | L29 A13 | A14 L29 | L29 A14
fillet "Fillet1" radius 3 12 edges at (-41, -2, -77.0647) (-22.0647, -2, 77.0647) (22.0647, -2, -77.0647) (41, -2, -77.0647) (22.0647, -2, -86) (22.0647, -2, 77.0647) (-22.0647, -2, 86) (-41, -2, 77.0647) (41, -2, 77.0647) (22.0647, -2, 86) (-22.0647, -2, -77.0647) (-22.0647, -2, -86)
extrude "Extrusion14" cut sketch "Sketch4" against normal blind 1.5 contours L0 L1 L2 L4
extrude "Extrusion16" cut sketch "Sketch1" along normal blind 2.5 contours A12
equation "\"d3\" = d2"
equation "\"d4\" = d2"
equation "\"d5\" = d4"
equation "\"d6\" = d2"
equation "\"d7\" = d6"
equation "\"d8\" = d2"
equation "\"d9\" = d8"
properties part number "enclosed top"
